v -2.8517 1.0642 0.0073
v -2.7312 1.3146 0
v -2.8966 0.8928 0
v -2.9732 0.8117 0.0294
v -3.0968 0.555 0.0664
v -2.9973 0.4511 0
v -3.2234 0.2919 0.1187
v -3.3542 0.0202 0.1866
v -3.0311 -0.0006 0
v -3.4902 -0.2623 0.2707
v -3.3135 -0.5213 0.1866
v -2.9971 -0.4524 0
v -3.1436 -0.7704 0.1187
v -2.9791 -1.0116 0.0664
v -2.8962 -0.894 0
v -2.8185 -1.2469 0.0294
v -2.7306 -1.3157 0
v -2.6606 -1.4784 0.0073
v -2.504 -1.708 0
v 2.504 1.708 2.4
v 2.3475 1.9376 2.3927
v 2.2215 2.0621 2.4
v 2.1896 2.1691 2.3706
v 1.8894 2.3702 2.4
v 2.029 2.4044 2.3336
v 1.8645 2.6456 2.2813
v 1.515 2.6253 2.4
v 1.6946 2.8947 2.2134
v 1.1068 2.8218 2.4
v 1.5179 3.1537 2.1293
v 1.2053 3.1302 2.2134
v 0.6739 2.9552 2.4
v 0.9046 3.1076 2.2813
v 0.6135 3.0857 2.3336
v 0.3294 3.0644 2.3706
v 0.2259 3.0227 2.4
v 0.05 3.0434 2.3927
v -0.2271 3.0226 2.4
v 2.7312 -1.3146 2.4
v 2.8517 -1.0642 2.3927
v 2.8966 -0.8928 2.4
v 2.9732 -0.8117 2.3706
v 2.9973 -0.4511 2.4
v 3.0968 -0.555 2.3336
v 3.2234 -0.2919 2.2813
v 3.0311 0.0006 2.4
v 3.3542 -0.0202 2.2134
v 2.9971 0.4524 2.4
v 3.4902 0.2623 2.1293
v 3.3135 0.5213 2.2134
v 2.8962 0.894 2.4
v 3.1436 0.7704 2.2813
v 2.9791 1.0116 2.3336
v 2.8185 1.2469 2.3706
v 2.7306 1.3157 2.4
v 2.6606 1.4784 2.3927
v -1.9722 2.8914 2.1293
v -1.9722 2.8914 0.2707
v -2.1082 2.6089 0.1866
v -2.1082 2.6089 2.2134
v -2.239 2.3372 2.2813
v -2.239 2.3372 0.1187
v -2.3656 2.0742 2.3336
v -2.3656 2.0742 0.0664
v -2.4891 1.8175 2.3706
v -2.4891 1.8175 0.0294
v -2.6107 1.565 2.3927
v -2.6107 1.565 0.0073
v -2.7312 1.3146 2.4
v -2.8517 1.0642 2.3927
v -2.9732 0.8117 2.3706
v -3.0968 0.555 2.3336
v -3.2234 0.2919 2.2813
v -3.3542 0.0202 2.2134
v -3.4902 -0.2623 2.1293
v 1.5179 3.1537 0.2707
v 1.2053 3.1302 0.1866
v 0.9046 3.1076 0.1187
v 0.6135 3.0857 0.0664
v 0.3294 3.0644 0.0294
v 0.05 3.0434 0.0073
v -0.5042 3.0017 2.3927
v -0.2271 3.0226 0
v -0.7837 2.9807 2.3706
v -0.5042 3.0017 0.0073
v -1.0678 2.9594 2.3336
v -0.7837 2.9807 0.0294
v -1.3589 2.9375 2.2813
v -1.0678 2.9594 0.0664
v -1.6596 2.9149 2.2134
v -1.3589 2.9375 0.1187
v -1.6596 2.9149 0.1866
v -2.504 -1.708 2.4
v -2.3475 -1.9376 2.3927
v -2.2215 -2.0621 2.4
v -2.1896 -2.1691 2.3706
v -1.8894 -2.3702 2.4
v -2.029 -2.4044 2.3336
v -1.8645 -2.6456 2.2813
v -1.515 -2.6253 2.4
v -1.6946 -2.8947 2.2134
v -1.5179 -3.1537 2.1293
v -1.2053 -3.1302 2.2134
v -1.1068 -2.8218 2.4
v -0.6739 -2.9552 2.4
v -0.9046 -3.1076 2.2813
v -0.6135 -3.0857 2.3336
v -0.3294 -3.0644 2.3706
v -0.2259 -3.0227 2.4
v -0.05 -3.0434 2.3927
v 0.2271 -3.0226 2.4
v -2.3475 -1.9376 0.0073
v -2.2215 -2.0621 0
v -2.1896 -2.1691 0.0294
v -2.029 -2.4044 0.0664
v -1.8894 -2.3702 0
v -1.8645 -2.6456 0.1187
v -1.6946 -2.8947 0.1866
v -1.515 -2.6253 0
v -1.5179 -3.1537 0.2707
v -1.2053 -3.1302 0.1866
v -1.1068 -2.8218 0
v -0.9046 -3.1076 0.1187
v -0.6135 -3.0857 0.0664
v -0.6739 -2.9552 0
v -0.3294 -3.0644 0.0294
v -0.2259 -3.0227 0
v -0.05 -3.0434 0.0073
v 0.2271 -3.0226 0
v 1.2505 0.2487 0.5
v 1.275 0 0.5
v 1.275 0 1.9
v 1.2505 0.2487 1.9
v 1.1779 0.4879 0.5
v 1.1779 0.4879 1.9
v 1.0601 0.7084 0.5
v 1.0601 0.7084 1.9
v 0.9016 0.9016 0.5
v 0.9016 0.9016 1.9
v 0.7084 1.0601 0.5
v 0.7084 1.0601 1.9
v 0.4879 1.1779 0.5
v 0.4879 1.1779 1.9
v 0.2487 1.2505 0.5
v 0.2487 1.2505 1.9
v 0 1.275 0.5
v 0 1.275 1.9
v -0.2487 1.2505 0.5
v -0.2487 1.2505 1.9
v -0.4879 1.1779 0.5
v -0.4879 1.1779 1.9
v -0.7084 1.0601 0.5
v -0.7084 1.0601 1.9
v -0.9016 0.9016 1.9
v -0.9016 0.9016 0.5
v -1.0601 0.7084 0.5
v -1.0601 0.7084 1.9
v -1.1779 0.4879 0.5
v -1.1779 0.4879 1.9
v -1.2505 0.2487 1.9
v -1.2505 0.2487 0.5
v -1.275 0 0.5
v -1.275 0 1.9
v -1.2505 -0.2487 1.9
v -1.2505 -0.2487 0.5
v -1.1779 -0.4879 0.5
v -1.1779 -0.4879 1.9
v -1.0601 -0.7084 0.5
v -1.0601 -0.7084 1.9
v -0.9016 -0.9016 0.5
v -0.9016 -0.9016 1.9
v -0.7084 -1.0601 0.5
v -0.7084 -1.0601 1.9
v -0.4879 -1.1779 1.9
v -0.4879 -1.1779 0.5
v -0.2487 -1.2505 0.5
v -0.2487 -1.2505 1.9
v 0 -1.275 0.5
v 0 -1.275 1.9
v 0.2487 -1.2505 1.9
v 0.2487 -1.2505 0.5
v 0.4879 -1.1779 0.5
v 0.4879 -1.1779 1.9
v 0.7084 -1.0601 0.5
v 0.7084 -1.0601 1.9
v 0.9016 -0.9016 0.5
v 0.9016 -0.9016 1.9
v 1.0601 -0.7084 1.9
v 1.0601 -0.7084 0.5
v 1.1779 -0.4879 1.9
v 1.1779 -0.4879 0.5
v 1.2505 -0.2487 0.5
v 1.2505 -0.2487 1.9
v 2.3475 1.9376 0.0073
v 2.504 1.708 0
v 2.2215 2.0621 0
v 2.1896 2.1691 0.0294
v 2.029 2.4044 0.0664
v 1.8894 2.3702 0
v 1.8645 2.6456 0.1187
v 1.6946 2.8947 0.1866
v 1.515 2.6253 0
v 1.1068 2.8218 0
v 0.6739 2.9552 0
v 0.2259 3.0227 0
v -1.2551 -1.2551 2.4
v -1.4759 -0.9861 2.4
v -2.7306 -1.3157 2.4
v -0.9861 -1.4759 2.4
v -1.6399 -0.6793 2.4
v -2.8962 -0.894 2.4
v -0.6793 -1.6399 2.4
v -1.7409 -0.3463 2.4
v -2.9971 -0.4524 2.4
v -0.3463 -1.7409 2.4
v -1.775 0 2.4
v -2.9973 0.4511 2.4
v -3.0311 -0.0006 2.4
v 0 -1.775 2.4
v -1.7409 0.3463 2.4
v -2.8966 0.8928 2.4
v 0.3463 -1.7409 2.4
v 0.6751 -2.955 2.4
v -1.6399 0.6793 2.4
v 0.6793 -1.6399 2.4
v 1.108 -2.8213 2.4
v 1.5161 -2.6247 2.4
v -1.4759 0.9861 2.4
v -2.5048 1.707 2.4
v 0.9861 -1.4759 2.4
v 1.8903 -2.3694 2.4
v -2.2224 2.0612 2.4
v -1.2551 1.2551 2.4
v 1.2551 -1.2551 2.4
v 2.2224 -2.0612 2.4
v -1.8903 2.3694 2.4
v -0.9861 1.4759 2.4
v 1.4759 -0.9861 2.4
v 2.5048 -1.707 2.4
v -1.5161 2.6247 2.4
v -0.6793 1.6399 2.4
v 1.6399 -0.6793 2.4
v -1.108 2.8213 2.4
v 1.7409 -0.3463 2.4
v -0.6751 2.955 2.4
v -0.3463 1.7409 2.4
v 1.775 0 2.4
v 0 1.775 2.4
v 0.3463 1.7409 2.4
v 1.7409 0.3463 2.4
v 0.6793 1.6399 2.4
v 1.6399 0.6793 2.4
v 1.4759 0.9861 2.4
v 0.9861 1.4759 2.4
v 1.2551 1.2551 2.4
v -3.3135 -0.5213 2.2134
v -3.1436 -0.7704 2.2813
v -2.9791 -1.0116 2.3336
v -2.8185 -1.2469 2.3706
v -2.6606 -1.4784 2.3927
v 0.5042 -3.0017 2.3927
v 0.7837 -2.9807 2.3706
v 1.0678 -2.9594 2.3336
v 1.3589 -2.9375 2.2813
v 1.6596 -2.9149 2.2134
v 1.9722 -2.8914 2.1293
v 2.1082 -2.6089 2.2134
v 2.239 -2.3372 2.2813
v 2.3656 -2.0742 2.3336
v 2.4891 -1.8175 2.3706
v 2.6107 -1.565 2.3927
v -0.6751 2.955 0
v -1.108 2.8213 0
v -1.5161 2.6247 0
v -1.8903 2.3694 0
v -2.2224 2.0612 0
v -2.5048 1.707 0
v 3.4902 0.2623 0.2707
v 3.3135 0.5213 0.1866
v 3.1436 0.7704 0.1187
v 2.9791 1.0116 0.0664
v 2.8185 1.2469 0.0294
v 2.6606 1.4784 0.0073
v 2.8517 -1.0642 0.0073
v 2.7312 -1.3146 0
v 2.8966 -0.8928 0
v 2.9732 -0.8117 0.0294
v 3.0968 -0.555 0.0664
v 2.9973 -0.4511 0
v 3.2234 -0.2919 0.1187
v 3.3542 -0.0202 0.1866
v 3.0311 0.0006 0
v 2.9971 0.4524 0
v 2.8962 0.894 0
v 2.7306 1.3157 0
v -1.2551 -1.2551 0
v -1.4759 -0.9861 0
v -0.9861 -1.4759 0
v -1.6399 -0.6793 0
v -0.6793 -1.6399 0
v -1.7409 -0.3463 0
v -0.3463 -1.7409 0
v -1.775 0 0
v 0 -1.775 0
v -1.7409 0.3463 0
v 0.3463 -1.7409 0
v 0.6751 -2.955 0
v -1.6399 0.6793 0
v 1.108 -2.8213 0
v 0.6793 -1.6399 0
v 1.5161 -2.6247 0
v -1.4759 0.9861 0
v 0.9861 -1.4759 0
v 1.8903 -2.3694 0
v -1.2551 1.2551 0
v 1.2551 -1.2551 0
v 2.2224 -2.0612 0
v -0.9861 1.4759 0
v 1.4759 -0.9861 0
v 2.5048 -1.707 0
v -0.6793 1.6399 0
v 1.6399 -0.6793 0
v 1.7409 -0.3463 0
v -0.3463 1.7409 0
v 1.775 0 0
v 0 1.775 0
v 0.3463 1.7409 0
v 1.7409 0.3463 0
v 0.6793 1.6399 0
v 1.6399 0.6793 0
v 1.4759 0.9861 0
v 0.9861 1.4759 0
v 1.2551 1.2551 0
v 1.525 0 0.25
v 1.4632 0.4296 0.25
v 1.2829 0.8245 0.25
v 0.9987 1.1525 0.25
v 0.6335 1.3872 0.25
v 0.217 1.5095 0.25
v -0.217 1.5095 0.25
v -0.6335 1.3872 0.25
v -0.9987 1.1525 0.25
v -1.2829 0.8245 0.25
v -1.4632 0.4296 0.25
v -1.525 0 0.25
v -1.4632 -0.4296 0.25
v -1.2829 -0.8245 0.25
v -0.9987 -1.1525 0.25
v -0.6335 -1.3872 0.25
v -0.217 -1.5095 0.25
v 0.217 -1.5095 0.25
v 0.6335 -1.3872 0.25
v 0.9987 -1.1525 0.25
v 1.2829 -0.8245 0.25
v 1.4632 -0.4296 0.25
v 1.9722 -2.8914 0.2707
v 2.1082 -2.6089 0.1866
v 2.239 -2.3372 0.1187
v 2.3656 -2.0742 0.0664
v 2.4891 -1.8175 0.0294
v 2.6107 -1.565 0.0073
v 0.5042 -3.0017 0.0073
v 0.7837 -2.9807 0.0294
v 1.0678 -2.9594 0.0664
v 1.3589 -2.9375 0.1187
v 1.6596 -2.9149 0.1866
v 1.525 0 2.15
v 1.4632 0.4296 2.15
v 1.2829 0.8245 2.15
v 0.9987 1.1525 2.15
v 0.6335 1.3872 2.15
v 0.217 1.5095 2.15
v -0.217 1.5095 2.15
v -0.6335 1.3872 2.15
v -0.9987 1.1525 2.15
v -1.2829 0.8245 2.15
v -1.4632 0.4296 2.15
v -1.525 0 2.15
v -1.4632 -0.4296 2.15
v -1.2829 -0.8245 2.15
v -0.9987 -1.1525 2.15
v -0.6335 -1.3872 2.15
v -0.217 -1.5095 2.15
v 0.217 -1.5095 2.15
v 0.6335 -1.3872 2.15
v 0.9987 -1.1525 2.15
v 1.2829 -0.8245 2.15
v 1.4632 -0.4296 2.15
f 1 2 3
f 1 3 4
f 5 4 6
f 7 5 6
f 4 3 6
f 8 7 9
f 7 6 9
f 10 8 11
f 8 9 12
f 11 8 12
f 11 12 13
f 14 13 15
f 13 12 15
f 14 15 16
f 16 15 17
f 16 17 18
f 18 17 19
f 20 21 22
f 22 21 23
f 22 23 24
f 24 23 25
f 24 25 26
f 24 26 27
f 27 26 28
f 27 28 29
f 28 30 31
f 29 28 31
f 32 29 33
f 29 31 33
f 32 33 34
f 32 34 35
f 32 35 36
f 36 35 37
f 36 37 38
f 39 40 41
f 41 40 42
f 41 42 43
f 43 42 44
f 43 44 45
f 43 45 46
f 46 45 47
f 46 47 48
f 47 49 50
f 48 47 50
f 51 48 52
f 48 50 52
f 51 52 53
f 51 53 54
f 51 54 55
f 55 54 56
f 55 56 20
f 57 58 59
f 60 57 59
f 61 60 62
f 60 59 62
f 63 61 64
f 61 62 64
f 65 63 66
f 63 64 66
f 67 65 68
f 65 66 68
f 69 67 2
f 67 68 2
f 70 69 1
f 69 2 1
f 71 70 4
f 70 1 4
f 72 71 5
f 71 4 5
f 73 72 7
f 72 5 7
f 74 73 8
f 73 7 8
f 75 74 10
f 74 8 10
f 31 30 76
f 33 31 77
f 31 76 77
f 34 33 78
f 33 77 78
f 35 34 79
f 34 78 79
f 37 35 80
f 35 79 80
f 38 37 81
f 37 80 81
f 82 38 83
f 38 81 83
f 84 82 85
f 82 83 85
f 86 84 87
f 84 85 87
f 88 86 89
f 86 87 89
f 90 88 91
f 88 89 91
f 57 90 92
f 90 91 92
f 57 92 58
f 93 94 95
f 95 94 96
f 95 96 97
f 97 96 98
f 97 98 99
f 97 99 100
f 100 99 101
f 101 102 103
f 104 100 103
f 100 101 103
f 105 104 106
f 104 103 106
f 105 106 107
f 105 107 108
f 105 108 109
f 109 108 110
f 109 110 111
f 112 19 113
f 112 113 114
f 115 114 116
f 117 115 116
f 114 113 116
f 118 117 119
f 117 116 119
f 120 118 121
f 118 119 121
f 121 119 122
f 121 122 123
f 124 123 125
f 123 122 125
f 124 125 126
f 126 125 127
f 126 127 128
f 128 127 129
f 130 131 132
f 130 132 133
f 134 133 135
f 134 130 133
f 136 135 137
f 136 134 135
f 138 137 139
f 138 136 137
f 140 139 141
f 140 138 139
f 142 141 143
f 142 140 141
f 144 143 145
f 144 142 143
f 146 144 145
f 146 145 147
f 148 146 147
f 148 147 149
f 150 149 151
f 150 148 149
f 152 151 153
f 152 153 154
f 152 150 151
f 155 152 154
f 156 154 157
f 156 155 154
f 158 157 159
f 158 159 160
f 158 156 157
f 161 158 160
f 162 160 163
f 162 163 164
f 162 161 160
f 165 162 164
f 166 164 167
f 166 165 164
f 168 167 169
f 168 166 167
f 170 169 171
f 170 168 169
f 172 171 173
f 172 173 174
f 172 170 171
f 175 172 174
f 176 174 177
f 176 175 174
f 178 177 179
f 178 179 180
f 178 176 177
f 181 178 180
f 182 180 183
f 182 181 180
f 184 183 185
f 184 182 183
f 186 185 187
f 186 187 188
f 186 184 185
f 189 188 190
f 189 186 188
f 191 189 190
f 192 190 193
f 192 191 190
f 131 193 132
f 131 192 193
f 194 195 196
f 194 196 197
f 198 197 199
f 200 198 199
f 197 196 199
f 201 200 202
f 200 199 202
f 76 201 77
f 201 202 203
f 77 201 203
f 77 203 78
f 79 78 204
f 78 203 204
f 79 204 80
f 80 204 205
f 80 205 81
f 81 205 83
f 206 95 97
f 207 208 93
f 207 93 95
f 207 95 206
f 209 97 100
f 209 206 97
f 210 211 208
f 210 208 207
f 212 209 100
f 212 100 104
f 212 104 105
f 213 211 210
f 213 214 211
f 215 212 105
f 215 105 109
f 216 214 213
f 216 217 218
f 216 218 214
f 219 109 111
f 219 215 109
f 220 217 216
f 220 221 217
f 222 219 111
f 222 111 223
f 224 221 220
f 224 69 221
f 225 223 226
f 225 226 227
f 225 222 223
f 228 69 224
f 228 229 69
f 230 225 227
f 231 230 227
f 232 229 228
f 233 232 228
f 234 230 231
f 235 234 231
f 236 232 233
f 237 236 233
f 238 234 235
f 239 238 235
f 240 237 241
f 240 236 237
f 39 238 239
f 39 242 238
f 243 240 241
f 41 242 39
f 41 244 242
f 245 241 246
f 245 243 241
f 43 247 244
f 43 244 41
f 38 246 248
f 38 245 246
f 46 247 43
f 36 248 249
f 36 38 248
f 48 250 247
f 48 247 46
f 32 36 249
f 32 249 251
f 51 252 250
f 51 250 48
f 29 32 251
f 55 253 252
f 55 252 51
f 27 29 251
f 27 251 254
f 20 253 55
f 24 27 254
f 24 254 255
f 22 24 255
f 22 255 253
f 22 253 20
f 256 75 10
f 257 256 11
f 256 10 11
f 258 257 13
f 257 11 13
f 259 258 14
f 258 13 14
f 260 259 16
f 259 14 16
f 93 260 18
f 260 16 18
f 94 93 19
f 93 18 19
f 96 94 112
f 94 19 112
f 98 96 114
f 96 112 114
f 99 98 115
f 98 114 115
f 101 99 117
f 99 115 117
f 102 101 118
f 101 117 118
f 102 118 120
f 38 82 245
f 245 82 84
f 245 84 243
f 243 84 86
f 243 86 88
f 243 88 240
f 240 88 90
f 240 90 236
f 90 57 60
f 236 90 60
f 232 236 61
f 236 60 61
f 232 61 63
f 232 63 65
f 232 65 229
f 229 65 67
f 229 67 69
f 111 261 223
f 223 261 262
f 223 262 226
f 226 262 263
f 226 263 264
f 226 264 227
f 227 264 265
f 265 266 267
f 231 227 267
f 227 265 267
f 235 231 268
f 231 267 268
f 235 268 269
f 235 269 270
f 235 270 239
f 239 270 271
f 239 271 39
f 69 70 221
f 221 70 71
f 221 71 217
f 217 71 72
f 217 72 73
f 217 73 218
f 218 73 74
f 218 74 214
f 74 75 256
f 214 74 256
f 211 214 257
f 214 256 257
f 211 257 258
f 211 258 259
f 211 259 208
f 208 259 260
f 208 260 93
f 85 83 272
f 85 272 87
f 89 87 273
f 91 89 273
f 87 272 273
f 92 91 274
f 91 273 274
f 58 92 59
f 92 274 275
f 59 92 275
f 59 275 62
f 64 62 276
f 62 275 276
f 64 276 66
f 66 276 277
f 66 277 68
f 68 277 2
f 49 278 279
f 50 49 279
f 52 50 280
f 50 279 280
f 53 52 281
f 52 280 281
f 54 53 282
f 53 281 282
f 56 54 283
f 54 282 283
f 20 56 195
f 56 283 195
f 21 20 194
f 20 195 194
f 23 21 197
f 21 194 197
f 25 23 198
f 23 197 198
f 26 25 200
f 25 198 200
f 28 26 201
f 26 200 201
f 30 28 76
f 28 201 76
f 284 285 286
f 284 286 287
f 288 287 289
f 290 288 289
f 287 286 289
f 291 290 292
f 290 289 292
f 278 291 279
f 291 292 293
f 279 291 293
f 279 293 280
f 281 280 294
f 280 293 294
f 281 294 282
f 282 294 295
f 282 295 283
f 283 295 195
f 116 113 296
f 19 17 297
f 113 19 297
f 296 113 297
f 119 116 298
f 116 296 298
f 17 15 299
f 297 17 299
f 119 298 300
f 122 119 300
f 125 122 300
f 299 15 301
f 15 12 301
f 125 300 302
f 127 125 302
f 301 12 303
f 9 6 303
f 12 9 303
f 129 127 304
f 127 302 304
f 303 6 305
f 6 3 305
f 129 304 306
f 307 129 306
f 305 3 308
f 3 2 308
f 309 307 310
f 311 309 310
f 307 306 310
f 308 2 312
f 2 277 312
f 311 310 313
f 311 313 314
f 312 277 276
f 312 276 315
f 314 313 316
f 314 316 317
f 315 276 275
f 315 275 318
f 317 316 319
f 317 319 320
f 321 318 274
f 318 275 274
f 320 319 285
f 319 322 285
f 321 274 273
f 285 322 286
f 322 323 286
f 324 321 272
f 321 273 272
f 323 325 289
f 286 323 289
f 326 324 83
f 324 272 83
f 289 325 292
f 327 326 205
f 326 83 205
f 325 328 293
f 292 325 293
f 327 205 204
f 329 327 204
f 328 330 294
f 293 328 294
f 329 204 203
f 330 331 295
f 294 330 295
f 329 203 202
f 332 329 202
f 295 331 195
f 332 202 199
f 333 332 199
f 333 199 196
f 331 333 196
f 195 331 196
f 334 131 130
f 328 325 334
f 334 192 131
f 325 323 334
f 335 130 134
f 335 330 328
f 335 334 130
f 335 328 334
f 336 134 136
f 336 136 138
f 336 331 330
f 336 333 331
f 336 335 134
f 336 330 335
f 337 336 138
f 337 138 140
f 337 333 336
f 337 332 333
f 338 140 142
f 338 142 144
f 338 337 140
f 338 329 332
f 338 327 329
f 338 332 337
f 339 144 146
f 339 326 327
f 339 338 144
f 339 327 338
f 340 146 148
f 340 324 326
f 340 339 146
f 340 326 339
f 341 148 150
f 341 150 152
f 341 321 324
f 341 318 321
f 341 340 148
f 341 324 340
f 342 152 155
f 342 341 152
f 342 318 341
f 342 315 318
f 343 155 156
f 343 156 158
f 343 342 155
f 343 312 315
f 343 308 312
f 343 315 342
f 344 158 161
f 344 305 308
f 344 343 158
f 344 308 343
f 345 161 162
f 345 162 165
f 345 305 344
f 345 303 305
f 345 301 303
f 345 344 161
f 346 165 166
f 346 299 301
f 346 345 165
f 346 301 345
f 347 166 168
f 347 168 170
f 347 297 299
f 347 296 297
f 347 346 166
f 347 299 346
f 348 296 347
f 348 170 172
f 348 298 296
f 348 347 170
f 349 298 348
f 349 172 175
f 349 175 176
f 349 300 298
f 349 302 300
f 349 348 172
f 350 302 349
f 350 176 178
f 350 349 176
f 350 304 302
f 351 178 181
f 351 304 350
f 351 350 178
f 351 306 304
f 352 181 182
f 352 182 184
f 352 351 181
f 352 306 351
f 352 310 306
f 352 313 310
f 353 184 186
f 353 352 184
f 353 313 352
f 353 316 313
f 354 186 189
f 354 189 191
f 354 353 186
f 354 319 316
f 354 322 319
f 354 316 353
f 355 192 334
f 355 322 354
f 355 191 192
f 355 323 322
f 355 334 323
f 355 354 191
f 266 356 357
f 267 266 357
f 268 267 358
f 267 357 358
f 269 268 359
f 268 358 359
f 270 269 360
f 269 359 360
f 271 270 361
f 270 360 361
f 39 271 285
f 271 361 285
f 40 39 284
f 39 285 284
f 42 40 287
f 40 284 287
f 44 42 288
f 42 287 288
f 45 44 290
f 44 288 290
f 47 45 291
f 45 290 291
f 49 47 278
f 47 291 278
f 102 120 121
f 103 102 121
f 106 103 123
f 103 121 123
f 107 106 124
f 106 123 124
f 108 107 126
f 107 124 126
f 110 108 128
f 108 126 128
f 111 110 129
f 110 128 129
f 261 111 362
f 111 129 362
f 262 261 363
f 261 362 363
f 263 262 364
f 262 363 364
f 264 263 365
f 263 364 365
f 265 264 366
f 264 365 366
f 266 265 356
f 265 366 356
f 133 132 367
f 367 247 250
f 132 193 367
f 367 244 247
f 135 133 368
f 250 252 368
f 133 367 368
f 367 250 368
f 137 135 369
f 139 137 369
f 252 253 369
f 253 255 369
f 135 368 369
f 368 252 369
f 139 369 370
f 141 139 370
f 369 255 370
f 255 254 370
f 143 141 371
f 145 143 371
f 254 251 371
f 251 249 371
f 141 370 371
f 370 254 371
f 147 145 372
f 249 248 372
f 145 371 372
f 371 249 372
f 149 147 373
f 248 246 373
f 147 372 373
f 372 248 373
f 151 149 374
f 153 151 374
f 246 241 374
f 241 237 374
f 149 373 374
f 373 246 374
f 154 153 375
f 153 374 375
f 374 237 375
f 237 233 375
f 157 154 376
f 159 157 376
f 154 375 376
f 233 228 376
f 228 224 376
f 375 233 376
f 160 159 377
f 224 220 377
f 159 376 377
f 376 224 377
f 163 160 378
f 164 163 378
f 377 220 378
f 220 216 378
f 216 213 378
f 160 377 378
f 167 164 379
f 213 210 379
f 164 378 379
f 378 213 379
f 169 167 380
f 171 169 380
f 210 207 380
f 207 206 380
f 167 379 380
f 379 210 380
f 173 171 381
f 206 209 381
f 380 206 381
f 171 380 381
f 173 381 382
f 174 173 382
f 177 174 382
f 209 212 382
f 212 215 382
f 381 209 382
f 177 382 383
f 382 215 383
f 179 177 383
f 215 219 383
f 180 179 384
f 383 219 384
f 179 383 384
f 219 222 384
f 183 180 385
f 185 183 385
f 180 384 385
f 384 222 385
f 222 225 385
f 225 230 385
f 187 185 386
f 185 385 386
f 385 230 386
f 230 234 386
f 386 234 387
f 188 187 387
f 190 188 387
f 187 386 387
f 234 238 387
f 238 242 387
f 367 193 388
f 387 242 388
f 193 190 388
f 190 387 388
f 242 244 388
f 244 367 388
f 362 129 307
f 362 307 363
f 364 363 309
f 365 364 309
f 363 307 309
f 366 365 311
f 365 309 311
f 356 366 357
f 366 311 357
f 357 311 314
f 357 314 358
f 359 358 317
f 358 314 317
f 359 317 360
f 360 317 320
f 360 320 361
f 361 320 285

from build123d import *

# Parameters (mm, degrees)
SKICA1_R                = 1.275
P_IDAT_VYSUNUT_M1_DEPTH = 2.4
ZKOSEN_1_SIZE           = 0.5


with BuildPart() as part:
    # Skica1 → Přidat vysunutím1 (new body)
    with BuildSketch(Plane.XY):
        Polygon((1.517935358, 3.153707699), (-1.972223305, 2.89142443), (-3.490158662, -0.262283268), (-1.517935358, -3.153707699), (1.972223305, -2.89142443), (3.490158662, 0.262283268), align=None)
        Circle(SKICA1_R, mode=Mode.SUBTRACT)
    extrude(amount=P_IDAT_VYSUNUT_M1_DEPTH)

    # Zkosení1
    zkosen_1_edges = [part.edges().sort_by_distance(p)[0] for p in [
        (-1.275, 0, 0),
        (-1.275, 0, 2.4),
    ]]
    chamfer(zkosen_1_edges, length=ZKOSEN_1_SIZE)

    # Skica3 → Odebrat rotací1 (revolve, cut)
    with BuildSketch(Plane(origin=(0, 0, 0), x_dir=(0.9010593425374666, -0.43369581647273064, 0), z_dir=(0.43369581647273064, 0.9010593425374666, 0))):
        Polygon((-5.109549882, 0), (-5.109549882, -1.2), (-3.031088913, 0), align=None)
        Polygon((-5.109549882, -2.4), (-3.031088913, -2.4), (-5.109549882, -1.2), align=None)
    revolve(axis=Axis((0, 0, 2.4), (0, 0, 1)), mode=Mode.SUBTRACT)


solid = part.part
